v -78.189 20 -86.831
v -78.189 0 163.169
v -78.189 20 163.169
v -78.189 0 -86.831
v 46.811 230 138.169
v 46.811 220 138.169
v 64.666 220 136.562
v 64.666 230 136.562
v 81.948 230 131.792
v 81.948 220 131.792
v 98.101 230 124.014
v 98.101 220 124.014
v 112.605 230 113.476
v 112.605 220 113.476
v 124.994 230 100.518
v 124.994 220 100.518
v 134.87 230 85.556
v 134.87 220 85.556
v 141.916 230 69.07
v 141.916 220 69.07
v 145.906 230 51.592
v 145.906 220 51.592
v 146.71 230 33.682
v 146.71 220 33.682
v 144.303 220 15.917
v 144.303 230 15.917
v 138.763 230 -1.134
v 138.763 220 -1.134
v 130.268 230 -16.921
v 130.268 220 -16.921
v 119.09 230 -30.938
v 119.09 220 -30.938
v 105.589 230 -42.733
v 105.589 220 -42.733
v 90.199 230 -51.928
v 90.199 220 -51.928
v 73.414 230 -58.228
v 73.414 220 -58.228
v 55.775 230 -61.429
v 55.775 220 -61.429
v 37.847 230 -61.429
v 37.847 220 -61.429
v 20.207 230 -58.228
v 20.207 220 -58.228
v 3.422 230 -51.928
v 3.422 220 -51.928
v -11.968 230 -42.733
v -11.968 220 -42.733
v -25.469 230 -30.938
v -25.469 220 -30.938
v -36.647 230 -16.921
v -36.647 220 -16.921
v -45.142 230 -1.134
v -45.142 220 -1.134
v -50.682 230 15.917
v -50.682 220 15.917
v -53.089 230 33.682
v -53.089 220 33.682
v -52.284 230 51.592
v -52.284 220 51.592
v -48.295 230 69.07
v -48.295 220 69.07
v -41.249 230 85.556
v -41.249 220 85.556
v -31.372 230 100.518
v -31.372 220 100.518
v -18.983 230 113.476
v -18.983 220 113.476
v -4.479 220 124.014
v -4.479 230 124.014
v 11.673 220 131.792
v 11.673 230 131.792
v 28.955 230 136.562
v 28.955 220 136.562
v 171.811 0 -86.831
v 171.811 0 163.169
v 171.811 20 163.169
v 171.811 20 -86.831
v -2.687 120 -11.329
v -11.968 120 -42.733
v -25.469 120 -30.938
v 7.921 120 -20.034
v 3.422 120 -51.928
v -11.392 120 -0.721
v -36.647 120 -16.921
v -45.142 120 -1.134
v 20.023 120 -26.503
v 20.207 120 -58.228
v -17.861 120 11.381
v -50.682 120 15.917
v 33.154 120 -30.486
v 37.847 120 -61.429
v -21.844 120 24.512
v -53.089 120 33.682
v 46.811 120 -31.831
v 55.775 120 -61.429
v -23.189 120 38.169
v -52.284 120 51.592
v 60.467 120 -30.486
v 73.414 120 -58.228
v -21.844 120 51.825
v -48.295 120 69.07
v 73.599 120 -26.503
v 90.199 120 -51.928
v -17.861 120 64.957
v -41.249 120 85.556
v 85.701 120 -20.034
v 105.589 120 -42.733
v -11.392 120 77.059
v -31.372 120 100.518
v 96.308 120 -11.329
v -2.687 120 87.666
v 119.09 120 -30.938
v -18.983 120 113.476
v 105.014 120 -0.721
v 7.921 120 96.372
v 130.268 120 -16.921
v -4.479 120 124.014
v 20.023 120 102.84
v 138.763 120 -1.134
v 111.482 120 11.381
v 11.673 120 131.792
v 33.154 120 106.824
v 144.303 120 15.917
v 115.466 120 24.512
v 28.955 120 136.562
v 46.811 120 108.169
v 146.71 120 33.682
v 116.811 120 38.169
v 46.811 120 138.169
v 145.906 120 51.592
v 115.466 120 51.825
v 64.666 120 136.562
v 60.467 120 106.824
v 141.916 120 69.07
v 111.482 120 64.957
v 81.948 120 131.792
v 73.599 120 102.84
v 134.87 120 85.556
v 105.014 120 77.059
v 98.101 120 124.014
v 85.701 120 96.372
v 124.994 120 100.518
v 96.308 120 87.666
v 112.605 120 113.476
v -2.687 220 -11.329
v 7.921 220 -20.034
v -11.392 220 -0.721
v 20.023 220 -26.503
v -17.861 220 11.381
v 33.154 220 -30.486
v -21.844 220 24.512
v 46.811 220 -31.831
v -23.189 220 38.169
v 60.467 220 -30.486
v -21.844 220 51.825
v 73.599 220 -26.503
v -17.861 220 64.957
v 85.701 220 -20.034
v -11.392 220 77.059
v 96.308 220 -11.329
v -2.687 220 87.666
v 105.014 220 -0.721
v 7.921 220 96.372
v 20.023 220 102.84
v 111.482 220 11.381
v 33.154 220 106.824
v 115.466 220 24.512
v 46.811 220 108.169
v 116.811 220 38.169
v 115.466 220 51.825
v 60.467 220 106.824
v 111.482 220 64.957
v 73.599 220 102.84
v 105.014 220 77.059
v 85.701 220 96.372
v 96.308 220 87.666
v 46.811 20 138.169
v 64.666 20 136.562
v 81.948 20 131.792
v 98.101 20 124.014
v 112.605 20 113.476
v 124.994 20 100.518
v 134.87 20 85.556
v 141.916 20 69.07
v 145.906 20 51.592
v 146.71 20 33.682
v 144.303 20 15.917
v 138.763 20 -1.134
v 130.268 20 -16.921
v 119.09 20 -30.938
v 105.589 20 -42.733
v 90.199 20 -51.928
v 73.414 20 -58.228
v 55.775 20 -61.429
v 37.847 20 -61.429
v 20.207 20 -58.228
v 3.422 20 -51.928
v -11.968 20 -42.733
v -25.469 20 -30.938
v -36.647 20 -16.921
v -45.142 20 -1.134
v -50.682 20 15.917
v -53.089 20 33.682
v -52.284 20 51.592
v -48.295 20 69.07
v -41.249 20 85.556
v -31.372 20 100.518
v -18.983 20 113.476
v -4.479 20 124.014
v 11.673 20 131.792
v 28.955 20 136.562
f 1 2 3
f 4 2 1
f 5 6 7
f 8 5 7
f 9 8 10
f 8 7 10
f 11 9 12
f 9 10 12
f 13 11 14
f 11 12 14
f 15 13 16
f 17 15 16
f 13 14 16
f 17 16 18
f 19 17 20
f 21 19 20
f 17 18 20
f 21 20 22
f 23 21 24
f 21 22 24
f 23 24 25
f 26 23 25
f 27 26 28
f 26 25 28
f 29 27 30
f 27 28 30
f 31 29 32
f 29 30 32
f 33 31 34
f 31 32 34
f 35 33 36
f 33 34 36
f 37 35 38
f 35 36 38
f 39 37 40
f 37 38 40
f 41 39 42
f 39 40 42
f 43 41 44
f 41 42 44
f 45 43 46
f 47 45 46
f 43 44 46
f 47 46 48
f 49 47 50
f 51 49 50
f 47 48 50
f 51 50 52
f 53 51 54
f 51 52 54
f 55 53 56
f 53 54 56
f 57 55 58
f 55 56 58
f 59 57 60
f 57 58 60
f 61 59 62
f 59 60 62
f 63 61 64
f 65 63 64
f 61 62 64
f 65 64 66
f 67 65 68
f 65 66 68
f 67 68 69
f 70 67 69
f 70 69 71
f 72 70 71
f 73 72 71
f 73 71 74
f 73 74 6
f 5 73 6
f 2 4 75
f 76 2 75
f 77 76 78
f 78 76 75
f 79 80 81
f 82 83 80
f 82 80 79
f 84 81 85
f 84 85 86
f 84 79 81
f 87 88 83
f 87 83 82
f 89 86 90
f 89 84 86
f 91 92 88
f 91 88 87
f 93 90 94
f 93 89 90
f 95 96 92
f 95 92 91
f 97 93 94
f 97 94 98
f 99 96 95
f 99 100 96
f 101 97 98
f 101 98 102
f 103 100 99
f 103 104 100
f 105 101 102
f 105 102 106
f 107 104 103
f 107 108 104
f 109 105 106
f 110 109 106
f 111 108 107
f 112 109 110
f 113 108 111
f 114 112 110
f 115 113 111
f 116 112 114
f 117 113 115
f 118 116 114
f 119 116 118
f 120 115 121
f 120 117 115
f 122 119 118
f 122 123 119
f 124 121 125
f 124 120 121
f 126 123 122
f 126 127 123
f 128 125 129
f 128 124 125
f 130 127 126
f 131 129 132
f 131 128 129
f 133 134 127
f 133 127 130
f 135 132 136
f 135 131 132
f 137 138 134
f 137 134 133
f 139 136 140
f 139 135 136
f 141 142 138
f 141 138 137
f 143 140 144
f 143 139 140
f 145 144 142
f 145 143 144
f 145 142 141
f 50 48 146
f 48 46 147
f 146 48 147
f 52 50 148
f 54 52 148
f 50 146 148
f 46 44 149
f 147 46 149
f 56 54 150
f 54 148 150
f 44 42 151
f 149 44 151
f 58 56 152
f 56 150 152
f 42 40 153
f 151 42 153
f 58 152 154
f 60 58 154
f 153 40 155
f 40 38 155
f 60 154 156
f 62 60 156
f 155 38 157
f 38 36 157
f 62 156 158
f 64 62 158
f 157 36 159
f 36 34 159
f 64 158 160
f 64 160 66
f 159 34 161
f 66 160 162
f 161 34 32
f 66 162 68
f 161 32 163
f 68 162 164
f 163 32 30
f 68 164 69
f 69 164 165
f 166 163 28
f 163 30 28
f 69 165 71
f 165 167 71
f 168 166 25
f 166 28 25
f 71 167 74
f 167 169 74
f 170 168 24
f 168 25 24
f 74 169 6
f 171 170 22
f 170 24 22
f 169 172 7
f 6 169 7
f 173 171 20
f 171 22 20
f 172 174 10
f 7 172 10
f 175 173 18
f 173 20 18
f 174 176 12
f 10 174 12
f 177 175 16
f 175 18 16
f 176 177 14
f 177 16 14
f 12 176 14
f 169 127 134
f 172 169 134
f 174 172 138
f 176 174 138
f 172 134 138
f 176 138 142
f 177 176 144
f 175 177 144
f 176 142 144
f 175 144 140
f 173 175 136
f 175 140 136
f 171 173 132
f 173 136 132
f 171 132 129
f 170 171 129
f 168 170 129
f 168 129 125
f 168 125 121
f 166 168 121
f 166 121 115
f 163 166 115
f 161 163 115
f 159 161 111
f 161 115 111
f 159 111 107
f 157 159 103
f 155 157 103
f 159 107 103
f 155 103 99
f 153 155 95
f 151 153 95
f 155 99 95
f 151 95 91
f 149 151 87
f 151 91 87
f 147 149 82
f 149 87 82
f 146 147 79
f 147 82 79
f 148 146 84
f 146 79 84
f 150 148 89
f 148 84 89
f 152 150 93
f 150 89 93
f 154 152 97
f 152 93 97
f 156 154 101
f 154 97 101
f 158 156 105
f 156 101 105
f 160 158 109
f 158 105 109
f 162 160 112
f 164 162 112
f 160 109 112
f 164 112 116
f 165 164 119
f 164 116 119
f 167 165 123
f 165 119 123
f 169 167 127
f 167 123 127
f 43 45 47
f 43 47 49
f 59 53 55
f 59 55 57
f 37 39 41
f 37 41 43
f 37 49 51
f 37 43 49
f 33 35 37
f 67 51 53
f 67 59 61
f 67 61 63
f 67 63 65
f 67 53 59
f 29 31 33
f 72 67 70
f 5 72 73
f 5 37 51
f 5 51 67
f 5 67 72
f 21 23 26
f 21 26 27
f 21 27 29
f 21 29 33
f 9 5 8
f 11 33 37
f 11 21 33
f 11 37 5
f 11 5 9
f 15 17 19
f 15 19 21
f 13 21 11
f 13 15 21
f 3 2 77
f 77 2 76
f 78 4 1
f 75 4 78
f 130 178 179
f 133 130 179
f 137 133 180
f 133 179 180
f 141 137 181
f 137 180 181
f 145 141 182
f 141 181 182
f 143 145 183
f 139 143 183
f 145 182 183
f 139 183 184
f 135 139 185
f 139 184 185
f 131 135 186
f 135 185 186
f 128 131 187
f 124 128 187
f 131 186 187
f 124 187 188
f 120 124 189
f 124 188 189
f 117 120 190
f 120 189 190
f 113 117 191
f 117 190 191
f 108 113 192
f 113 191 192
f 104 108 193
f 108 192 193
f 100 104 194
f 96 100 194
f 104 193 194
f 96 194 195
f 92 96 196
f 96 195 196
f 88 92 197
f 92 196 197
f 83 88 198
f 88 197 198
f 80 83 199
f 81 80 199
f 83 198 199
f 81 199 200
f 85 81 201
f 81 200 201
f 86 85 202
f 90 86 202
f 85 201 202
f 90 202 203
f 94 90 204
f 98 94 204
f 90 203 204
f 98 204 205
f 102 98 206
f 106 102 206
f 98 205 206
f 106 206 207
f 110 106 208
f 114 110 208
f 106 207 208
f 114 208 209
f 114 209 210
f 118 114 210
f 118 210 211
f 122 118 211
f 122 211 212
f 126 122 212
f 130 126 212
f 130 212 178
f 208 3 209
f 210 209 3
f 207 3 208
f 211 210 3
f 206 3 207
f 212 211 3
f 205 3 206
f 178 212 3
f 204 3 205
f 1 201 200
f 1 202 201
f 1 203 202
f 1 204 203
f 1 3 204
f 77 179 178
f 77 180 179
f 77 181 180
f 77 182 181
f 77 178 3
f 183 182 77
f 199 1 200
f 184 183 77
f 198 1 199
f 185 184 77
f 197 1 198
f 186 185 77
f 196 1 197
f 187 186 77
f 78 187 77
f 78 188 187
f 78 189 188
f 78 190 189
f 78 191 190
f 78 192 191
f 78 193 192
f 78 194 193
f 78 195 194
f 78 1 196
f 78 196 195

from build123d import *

# Parameters (mm, degrees)
SKETCH1_W           = 250
SKETCH1_H           = 250
BOSS_EXTRUDE1_DEPTH = 20
SKETCH2_R           = 100
BOSS_EXTRUDE2_DEPTH = 100
SKETCH3_R           = 70
BOSS_EXTRUDE3_DEPTH = 100
SKETCH4_R           = 100
BOSS_EXTRUDE4_DEPTH = 10


with BuildPart() as part:
    # Sketch1 → Boss-Extrude1 (new body)
    with BuildSketch(Plane(origin=(0, 0, 0), x_dir=(1, 0, 0), z_dir=(0, 1, 0))):
        with Locations((46.810699588, -38.16872428)):
            Rectangle(SKETCH1_W, SKETCH1_H)
    extrude(amount=BOSS_EXTRUDE1_DEPTH)

    # Sketch2 → Boss-Extrude2 (add)
    with BuildSketch(Plane(origin=(0, 20, 0), x_dir=(1, 0, 0), z_dir=(0, 1, 0))):
        with Locations(Location((46.810699588, -38.16872428, 0), (0, 0, 270))):
            Circle(SKETCH2_R)
    extrude(amount=BOSS_EXTRUDE2_DEPTH)

    # Sketch3 → Boss-Extrude3 (add)
    with BuildSketch(Plane(origin=(0, 120, 0), x_dir=(1, 0, 0), z_dir=(0, 1, 0))):
        with Locations(Location((46.810699588, -38.16872428, 0), (0, 0, 270))):
            Circle(SKETCH3_R)
    extrude(amount=BOSS_EXTRUDE3_DEPTH)

    # Sketch4 → Boss-Extrude4 (add)
    with BuildSketch(Plane(origin=(0, 220, 0), x_dir=(1, 0, 0), z_dir=(0, 1, 0))):
        with Locations(Location((46.810699588, -38.16872428, 0), (0, 0, 270))):
            Circle(SKETCH4_R)
    extrude(amount=BOSS_EXTRUDE4_DEPTH)


solid = part.part
